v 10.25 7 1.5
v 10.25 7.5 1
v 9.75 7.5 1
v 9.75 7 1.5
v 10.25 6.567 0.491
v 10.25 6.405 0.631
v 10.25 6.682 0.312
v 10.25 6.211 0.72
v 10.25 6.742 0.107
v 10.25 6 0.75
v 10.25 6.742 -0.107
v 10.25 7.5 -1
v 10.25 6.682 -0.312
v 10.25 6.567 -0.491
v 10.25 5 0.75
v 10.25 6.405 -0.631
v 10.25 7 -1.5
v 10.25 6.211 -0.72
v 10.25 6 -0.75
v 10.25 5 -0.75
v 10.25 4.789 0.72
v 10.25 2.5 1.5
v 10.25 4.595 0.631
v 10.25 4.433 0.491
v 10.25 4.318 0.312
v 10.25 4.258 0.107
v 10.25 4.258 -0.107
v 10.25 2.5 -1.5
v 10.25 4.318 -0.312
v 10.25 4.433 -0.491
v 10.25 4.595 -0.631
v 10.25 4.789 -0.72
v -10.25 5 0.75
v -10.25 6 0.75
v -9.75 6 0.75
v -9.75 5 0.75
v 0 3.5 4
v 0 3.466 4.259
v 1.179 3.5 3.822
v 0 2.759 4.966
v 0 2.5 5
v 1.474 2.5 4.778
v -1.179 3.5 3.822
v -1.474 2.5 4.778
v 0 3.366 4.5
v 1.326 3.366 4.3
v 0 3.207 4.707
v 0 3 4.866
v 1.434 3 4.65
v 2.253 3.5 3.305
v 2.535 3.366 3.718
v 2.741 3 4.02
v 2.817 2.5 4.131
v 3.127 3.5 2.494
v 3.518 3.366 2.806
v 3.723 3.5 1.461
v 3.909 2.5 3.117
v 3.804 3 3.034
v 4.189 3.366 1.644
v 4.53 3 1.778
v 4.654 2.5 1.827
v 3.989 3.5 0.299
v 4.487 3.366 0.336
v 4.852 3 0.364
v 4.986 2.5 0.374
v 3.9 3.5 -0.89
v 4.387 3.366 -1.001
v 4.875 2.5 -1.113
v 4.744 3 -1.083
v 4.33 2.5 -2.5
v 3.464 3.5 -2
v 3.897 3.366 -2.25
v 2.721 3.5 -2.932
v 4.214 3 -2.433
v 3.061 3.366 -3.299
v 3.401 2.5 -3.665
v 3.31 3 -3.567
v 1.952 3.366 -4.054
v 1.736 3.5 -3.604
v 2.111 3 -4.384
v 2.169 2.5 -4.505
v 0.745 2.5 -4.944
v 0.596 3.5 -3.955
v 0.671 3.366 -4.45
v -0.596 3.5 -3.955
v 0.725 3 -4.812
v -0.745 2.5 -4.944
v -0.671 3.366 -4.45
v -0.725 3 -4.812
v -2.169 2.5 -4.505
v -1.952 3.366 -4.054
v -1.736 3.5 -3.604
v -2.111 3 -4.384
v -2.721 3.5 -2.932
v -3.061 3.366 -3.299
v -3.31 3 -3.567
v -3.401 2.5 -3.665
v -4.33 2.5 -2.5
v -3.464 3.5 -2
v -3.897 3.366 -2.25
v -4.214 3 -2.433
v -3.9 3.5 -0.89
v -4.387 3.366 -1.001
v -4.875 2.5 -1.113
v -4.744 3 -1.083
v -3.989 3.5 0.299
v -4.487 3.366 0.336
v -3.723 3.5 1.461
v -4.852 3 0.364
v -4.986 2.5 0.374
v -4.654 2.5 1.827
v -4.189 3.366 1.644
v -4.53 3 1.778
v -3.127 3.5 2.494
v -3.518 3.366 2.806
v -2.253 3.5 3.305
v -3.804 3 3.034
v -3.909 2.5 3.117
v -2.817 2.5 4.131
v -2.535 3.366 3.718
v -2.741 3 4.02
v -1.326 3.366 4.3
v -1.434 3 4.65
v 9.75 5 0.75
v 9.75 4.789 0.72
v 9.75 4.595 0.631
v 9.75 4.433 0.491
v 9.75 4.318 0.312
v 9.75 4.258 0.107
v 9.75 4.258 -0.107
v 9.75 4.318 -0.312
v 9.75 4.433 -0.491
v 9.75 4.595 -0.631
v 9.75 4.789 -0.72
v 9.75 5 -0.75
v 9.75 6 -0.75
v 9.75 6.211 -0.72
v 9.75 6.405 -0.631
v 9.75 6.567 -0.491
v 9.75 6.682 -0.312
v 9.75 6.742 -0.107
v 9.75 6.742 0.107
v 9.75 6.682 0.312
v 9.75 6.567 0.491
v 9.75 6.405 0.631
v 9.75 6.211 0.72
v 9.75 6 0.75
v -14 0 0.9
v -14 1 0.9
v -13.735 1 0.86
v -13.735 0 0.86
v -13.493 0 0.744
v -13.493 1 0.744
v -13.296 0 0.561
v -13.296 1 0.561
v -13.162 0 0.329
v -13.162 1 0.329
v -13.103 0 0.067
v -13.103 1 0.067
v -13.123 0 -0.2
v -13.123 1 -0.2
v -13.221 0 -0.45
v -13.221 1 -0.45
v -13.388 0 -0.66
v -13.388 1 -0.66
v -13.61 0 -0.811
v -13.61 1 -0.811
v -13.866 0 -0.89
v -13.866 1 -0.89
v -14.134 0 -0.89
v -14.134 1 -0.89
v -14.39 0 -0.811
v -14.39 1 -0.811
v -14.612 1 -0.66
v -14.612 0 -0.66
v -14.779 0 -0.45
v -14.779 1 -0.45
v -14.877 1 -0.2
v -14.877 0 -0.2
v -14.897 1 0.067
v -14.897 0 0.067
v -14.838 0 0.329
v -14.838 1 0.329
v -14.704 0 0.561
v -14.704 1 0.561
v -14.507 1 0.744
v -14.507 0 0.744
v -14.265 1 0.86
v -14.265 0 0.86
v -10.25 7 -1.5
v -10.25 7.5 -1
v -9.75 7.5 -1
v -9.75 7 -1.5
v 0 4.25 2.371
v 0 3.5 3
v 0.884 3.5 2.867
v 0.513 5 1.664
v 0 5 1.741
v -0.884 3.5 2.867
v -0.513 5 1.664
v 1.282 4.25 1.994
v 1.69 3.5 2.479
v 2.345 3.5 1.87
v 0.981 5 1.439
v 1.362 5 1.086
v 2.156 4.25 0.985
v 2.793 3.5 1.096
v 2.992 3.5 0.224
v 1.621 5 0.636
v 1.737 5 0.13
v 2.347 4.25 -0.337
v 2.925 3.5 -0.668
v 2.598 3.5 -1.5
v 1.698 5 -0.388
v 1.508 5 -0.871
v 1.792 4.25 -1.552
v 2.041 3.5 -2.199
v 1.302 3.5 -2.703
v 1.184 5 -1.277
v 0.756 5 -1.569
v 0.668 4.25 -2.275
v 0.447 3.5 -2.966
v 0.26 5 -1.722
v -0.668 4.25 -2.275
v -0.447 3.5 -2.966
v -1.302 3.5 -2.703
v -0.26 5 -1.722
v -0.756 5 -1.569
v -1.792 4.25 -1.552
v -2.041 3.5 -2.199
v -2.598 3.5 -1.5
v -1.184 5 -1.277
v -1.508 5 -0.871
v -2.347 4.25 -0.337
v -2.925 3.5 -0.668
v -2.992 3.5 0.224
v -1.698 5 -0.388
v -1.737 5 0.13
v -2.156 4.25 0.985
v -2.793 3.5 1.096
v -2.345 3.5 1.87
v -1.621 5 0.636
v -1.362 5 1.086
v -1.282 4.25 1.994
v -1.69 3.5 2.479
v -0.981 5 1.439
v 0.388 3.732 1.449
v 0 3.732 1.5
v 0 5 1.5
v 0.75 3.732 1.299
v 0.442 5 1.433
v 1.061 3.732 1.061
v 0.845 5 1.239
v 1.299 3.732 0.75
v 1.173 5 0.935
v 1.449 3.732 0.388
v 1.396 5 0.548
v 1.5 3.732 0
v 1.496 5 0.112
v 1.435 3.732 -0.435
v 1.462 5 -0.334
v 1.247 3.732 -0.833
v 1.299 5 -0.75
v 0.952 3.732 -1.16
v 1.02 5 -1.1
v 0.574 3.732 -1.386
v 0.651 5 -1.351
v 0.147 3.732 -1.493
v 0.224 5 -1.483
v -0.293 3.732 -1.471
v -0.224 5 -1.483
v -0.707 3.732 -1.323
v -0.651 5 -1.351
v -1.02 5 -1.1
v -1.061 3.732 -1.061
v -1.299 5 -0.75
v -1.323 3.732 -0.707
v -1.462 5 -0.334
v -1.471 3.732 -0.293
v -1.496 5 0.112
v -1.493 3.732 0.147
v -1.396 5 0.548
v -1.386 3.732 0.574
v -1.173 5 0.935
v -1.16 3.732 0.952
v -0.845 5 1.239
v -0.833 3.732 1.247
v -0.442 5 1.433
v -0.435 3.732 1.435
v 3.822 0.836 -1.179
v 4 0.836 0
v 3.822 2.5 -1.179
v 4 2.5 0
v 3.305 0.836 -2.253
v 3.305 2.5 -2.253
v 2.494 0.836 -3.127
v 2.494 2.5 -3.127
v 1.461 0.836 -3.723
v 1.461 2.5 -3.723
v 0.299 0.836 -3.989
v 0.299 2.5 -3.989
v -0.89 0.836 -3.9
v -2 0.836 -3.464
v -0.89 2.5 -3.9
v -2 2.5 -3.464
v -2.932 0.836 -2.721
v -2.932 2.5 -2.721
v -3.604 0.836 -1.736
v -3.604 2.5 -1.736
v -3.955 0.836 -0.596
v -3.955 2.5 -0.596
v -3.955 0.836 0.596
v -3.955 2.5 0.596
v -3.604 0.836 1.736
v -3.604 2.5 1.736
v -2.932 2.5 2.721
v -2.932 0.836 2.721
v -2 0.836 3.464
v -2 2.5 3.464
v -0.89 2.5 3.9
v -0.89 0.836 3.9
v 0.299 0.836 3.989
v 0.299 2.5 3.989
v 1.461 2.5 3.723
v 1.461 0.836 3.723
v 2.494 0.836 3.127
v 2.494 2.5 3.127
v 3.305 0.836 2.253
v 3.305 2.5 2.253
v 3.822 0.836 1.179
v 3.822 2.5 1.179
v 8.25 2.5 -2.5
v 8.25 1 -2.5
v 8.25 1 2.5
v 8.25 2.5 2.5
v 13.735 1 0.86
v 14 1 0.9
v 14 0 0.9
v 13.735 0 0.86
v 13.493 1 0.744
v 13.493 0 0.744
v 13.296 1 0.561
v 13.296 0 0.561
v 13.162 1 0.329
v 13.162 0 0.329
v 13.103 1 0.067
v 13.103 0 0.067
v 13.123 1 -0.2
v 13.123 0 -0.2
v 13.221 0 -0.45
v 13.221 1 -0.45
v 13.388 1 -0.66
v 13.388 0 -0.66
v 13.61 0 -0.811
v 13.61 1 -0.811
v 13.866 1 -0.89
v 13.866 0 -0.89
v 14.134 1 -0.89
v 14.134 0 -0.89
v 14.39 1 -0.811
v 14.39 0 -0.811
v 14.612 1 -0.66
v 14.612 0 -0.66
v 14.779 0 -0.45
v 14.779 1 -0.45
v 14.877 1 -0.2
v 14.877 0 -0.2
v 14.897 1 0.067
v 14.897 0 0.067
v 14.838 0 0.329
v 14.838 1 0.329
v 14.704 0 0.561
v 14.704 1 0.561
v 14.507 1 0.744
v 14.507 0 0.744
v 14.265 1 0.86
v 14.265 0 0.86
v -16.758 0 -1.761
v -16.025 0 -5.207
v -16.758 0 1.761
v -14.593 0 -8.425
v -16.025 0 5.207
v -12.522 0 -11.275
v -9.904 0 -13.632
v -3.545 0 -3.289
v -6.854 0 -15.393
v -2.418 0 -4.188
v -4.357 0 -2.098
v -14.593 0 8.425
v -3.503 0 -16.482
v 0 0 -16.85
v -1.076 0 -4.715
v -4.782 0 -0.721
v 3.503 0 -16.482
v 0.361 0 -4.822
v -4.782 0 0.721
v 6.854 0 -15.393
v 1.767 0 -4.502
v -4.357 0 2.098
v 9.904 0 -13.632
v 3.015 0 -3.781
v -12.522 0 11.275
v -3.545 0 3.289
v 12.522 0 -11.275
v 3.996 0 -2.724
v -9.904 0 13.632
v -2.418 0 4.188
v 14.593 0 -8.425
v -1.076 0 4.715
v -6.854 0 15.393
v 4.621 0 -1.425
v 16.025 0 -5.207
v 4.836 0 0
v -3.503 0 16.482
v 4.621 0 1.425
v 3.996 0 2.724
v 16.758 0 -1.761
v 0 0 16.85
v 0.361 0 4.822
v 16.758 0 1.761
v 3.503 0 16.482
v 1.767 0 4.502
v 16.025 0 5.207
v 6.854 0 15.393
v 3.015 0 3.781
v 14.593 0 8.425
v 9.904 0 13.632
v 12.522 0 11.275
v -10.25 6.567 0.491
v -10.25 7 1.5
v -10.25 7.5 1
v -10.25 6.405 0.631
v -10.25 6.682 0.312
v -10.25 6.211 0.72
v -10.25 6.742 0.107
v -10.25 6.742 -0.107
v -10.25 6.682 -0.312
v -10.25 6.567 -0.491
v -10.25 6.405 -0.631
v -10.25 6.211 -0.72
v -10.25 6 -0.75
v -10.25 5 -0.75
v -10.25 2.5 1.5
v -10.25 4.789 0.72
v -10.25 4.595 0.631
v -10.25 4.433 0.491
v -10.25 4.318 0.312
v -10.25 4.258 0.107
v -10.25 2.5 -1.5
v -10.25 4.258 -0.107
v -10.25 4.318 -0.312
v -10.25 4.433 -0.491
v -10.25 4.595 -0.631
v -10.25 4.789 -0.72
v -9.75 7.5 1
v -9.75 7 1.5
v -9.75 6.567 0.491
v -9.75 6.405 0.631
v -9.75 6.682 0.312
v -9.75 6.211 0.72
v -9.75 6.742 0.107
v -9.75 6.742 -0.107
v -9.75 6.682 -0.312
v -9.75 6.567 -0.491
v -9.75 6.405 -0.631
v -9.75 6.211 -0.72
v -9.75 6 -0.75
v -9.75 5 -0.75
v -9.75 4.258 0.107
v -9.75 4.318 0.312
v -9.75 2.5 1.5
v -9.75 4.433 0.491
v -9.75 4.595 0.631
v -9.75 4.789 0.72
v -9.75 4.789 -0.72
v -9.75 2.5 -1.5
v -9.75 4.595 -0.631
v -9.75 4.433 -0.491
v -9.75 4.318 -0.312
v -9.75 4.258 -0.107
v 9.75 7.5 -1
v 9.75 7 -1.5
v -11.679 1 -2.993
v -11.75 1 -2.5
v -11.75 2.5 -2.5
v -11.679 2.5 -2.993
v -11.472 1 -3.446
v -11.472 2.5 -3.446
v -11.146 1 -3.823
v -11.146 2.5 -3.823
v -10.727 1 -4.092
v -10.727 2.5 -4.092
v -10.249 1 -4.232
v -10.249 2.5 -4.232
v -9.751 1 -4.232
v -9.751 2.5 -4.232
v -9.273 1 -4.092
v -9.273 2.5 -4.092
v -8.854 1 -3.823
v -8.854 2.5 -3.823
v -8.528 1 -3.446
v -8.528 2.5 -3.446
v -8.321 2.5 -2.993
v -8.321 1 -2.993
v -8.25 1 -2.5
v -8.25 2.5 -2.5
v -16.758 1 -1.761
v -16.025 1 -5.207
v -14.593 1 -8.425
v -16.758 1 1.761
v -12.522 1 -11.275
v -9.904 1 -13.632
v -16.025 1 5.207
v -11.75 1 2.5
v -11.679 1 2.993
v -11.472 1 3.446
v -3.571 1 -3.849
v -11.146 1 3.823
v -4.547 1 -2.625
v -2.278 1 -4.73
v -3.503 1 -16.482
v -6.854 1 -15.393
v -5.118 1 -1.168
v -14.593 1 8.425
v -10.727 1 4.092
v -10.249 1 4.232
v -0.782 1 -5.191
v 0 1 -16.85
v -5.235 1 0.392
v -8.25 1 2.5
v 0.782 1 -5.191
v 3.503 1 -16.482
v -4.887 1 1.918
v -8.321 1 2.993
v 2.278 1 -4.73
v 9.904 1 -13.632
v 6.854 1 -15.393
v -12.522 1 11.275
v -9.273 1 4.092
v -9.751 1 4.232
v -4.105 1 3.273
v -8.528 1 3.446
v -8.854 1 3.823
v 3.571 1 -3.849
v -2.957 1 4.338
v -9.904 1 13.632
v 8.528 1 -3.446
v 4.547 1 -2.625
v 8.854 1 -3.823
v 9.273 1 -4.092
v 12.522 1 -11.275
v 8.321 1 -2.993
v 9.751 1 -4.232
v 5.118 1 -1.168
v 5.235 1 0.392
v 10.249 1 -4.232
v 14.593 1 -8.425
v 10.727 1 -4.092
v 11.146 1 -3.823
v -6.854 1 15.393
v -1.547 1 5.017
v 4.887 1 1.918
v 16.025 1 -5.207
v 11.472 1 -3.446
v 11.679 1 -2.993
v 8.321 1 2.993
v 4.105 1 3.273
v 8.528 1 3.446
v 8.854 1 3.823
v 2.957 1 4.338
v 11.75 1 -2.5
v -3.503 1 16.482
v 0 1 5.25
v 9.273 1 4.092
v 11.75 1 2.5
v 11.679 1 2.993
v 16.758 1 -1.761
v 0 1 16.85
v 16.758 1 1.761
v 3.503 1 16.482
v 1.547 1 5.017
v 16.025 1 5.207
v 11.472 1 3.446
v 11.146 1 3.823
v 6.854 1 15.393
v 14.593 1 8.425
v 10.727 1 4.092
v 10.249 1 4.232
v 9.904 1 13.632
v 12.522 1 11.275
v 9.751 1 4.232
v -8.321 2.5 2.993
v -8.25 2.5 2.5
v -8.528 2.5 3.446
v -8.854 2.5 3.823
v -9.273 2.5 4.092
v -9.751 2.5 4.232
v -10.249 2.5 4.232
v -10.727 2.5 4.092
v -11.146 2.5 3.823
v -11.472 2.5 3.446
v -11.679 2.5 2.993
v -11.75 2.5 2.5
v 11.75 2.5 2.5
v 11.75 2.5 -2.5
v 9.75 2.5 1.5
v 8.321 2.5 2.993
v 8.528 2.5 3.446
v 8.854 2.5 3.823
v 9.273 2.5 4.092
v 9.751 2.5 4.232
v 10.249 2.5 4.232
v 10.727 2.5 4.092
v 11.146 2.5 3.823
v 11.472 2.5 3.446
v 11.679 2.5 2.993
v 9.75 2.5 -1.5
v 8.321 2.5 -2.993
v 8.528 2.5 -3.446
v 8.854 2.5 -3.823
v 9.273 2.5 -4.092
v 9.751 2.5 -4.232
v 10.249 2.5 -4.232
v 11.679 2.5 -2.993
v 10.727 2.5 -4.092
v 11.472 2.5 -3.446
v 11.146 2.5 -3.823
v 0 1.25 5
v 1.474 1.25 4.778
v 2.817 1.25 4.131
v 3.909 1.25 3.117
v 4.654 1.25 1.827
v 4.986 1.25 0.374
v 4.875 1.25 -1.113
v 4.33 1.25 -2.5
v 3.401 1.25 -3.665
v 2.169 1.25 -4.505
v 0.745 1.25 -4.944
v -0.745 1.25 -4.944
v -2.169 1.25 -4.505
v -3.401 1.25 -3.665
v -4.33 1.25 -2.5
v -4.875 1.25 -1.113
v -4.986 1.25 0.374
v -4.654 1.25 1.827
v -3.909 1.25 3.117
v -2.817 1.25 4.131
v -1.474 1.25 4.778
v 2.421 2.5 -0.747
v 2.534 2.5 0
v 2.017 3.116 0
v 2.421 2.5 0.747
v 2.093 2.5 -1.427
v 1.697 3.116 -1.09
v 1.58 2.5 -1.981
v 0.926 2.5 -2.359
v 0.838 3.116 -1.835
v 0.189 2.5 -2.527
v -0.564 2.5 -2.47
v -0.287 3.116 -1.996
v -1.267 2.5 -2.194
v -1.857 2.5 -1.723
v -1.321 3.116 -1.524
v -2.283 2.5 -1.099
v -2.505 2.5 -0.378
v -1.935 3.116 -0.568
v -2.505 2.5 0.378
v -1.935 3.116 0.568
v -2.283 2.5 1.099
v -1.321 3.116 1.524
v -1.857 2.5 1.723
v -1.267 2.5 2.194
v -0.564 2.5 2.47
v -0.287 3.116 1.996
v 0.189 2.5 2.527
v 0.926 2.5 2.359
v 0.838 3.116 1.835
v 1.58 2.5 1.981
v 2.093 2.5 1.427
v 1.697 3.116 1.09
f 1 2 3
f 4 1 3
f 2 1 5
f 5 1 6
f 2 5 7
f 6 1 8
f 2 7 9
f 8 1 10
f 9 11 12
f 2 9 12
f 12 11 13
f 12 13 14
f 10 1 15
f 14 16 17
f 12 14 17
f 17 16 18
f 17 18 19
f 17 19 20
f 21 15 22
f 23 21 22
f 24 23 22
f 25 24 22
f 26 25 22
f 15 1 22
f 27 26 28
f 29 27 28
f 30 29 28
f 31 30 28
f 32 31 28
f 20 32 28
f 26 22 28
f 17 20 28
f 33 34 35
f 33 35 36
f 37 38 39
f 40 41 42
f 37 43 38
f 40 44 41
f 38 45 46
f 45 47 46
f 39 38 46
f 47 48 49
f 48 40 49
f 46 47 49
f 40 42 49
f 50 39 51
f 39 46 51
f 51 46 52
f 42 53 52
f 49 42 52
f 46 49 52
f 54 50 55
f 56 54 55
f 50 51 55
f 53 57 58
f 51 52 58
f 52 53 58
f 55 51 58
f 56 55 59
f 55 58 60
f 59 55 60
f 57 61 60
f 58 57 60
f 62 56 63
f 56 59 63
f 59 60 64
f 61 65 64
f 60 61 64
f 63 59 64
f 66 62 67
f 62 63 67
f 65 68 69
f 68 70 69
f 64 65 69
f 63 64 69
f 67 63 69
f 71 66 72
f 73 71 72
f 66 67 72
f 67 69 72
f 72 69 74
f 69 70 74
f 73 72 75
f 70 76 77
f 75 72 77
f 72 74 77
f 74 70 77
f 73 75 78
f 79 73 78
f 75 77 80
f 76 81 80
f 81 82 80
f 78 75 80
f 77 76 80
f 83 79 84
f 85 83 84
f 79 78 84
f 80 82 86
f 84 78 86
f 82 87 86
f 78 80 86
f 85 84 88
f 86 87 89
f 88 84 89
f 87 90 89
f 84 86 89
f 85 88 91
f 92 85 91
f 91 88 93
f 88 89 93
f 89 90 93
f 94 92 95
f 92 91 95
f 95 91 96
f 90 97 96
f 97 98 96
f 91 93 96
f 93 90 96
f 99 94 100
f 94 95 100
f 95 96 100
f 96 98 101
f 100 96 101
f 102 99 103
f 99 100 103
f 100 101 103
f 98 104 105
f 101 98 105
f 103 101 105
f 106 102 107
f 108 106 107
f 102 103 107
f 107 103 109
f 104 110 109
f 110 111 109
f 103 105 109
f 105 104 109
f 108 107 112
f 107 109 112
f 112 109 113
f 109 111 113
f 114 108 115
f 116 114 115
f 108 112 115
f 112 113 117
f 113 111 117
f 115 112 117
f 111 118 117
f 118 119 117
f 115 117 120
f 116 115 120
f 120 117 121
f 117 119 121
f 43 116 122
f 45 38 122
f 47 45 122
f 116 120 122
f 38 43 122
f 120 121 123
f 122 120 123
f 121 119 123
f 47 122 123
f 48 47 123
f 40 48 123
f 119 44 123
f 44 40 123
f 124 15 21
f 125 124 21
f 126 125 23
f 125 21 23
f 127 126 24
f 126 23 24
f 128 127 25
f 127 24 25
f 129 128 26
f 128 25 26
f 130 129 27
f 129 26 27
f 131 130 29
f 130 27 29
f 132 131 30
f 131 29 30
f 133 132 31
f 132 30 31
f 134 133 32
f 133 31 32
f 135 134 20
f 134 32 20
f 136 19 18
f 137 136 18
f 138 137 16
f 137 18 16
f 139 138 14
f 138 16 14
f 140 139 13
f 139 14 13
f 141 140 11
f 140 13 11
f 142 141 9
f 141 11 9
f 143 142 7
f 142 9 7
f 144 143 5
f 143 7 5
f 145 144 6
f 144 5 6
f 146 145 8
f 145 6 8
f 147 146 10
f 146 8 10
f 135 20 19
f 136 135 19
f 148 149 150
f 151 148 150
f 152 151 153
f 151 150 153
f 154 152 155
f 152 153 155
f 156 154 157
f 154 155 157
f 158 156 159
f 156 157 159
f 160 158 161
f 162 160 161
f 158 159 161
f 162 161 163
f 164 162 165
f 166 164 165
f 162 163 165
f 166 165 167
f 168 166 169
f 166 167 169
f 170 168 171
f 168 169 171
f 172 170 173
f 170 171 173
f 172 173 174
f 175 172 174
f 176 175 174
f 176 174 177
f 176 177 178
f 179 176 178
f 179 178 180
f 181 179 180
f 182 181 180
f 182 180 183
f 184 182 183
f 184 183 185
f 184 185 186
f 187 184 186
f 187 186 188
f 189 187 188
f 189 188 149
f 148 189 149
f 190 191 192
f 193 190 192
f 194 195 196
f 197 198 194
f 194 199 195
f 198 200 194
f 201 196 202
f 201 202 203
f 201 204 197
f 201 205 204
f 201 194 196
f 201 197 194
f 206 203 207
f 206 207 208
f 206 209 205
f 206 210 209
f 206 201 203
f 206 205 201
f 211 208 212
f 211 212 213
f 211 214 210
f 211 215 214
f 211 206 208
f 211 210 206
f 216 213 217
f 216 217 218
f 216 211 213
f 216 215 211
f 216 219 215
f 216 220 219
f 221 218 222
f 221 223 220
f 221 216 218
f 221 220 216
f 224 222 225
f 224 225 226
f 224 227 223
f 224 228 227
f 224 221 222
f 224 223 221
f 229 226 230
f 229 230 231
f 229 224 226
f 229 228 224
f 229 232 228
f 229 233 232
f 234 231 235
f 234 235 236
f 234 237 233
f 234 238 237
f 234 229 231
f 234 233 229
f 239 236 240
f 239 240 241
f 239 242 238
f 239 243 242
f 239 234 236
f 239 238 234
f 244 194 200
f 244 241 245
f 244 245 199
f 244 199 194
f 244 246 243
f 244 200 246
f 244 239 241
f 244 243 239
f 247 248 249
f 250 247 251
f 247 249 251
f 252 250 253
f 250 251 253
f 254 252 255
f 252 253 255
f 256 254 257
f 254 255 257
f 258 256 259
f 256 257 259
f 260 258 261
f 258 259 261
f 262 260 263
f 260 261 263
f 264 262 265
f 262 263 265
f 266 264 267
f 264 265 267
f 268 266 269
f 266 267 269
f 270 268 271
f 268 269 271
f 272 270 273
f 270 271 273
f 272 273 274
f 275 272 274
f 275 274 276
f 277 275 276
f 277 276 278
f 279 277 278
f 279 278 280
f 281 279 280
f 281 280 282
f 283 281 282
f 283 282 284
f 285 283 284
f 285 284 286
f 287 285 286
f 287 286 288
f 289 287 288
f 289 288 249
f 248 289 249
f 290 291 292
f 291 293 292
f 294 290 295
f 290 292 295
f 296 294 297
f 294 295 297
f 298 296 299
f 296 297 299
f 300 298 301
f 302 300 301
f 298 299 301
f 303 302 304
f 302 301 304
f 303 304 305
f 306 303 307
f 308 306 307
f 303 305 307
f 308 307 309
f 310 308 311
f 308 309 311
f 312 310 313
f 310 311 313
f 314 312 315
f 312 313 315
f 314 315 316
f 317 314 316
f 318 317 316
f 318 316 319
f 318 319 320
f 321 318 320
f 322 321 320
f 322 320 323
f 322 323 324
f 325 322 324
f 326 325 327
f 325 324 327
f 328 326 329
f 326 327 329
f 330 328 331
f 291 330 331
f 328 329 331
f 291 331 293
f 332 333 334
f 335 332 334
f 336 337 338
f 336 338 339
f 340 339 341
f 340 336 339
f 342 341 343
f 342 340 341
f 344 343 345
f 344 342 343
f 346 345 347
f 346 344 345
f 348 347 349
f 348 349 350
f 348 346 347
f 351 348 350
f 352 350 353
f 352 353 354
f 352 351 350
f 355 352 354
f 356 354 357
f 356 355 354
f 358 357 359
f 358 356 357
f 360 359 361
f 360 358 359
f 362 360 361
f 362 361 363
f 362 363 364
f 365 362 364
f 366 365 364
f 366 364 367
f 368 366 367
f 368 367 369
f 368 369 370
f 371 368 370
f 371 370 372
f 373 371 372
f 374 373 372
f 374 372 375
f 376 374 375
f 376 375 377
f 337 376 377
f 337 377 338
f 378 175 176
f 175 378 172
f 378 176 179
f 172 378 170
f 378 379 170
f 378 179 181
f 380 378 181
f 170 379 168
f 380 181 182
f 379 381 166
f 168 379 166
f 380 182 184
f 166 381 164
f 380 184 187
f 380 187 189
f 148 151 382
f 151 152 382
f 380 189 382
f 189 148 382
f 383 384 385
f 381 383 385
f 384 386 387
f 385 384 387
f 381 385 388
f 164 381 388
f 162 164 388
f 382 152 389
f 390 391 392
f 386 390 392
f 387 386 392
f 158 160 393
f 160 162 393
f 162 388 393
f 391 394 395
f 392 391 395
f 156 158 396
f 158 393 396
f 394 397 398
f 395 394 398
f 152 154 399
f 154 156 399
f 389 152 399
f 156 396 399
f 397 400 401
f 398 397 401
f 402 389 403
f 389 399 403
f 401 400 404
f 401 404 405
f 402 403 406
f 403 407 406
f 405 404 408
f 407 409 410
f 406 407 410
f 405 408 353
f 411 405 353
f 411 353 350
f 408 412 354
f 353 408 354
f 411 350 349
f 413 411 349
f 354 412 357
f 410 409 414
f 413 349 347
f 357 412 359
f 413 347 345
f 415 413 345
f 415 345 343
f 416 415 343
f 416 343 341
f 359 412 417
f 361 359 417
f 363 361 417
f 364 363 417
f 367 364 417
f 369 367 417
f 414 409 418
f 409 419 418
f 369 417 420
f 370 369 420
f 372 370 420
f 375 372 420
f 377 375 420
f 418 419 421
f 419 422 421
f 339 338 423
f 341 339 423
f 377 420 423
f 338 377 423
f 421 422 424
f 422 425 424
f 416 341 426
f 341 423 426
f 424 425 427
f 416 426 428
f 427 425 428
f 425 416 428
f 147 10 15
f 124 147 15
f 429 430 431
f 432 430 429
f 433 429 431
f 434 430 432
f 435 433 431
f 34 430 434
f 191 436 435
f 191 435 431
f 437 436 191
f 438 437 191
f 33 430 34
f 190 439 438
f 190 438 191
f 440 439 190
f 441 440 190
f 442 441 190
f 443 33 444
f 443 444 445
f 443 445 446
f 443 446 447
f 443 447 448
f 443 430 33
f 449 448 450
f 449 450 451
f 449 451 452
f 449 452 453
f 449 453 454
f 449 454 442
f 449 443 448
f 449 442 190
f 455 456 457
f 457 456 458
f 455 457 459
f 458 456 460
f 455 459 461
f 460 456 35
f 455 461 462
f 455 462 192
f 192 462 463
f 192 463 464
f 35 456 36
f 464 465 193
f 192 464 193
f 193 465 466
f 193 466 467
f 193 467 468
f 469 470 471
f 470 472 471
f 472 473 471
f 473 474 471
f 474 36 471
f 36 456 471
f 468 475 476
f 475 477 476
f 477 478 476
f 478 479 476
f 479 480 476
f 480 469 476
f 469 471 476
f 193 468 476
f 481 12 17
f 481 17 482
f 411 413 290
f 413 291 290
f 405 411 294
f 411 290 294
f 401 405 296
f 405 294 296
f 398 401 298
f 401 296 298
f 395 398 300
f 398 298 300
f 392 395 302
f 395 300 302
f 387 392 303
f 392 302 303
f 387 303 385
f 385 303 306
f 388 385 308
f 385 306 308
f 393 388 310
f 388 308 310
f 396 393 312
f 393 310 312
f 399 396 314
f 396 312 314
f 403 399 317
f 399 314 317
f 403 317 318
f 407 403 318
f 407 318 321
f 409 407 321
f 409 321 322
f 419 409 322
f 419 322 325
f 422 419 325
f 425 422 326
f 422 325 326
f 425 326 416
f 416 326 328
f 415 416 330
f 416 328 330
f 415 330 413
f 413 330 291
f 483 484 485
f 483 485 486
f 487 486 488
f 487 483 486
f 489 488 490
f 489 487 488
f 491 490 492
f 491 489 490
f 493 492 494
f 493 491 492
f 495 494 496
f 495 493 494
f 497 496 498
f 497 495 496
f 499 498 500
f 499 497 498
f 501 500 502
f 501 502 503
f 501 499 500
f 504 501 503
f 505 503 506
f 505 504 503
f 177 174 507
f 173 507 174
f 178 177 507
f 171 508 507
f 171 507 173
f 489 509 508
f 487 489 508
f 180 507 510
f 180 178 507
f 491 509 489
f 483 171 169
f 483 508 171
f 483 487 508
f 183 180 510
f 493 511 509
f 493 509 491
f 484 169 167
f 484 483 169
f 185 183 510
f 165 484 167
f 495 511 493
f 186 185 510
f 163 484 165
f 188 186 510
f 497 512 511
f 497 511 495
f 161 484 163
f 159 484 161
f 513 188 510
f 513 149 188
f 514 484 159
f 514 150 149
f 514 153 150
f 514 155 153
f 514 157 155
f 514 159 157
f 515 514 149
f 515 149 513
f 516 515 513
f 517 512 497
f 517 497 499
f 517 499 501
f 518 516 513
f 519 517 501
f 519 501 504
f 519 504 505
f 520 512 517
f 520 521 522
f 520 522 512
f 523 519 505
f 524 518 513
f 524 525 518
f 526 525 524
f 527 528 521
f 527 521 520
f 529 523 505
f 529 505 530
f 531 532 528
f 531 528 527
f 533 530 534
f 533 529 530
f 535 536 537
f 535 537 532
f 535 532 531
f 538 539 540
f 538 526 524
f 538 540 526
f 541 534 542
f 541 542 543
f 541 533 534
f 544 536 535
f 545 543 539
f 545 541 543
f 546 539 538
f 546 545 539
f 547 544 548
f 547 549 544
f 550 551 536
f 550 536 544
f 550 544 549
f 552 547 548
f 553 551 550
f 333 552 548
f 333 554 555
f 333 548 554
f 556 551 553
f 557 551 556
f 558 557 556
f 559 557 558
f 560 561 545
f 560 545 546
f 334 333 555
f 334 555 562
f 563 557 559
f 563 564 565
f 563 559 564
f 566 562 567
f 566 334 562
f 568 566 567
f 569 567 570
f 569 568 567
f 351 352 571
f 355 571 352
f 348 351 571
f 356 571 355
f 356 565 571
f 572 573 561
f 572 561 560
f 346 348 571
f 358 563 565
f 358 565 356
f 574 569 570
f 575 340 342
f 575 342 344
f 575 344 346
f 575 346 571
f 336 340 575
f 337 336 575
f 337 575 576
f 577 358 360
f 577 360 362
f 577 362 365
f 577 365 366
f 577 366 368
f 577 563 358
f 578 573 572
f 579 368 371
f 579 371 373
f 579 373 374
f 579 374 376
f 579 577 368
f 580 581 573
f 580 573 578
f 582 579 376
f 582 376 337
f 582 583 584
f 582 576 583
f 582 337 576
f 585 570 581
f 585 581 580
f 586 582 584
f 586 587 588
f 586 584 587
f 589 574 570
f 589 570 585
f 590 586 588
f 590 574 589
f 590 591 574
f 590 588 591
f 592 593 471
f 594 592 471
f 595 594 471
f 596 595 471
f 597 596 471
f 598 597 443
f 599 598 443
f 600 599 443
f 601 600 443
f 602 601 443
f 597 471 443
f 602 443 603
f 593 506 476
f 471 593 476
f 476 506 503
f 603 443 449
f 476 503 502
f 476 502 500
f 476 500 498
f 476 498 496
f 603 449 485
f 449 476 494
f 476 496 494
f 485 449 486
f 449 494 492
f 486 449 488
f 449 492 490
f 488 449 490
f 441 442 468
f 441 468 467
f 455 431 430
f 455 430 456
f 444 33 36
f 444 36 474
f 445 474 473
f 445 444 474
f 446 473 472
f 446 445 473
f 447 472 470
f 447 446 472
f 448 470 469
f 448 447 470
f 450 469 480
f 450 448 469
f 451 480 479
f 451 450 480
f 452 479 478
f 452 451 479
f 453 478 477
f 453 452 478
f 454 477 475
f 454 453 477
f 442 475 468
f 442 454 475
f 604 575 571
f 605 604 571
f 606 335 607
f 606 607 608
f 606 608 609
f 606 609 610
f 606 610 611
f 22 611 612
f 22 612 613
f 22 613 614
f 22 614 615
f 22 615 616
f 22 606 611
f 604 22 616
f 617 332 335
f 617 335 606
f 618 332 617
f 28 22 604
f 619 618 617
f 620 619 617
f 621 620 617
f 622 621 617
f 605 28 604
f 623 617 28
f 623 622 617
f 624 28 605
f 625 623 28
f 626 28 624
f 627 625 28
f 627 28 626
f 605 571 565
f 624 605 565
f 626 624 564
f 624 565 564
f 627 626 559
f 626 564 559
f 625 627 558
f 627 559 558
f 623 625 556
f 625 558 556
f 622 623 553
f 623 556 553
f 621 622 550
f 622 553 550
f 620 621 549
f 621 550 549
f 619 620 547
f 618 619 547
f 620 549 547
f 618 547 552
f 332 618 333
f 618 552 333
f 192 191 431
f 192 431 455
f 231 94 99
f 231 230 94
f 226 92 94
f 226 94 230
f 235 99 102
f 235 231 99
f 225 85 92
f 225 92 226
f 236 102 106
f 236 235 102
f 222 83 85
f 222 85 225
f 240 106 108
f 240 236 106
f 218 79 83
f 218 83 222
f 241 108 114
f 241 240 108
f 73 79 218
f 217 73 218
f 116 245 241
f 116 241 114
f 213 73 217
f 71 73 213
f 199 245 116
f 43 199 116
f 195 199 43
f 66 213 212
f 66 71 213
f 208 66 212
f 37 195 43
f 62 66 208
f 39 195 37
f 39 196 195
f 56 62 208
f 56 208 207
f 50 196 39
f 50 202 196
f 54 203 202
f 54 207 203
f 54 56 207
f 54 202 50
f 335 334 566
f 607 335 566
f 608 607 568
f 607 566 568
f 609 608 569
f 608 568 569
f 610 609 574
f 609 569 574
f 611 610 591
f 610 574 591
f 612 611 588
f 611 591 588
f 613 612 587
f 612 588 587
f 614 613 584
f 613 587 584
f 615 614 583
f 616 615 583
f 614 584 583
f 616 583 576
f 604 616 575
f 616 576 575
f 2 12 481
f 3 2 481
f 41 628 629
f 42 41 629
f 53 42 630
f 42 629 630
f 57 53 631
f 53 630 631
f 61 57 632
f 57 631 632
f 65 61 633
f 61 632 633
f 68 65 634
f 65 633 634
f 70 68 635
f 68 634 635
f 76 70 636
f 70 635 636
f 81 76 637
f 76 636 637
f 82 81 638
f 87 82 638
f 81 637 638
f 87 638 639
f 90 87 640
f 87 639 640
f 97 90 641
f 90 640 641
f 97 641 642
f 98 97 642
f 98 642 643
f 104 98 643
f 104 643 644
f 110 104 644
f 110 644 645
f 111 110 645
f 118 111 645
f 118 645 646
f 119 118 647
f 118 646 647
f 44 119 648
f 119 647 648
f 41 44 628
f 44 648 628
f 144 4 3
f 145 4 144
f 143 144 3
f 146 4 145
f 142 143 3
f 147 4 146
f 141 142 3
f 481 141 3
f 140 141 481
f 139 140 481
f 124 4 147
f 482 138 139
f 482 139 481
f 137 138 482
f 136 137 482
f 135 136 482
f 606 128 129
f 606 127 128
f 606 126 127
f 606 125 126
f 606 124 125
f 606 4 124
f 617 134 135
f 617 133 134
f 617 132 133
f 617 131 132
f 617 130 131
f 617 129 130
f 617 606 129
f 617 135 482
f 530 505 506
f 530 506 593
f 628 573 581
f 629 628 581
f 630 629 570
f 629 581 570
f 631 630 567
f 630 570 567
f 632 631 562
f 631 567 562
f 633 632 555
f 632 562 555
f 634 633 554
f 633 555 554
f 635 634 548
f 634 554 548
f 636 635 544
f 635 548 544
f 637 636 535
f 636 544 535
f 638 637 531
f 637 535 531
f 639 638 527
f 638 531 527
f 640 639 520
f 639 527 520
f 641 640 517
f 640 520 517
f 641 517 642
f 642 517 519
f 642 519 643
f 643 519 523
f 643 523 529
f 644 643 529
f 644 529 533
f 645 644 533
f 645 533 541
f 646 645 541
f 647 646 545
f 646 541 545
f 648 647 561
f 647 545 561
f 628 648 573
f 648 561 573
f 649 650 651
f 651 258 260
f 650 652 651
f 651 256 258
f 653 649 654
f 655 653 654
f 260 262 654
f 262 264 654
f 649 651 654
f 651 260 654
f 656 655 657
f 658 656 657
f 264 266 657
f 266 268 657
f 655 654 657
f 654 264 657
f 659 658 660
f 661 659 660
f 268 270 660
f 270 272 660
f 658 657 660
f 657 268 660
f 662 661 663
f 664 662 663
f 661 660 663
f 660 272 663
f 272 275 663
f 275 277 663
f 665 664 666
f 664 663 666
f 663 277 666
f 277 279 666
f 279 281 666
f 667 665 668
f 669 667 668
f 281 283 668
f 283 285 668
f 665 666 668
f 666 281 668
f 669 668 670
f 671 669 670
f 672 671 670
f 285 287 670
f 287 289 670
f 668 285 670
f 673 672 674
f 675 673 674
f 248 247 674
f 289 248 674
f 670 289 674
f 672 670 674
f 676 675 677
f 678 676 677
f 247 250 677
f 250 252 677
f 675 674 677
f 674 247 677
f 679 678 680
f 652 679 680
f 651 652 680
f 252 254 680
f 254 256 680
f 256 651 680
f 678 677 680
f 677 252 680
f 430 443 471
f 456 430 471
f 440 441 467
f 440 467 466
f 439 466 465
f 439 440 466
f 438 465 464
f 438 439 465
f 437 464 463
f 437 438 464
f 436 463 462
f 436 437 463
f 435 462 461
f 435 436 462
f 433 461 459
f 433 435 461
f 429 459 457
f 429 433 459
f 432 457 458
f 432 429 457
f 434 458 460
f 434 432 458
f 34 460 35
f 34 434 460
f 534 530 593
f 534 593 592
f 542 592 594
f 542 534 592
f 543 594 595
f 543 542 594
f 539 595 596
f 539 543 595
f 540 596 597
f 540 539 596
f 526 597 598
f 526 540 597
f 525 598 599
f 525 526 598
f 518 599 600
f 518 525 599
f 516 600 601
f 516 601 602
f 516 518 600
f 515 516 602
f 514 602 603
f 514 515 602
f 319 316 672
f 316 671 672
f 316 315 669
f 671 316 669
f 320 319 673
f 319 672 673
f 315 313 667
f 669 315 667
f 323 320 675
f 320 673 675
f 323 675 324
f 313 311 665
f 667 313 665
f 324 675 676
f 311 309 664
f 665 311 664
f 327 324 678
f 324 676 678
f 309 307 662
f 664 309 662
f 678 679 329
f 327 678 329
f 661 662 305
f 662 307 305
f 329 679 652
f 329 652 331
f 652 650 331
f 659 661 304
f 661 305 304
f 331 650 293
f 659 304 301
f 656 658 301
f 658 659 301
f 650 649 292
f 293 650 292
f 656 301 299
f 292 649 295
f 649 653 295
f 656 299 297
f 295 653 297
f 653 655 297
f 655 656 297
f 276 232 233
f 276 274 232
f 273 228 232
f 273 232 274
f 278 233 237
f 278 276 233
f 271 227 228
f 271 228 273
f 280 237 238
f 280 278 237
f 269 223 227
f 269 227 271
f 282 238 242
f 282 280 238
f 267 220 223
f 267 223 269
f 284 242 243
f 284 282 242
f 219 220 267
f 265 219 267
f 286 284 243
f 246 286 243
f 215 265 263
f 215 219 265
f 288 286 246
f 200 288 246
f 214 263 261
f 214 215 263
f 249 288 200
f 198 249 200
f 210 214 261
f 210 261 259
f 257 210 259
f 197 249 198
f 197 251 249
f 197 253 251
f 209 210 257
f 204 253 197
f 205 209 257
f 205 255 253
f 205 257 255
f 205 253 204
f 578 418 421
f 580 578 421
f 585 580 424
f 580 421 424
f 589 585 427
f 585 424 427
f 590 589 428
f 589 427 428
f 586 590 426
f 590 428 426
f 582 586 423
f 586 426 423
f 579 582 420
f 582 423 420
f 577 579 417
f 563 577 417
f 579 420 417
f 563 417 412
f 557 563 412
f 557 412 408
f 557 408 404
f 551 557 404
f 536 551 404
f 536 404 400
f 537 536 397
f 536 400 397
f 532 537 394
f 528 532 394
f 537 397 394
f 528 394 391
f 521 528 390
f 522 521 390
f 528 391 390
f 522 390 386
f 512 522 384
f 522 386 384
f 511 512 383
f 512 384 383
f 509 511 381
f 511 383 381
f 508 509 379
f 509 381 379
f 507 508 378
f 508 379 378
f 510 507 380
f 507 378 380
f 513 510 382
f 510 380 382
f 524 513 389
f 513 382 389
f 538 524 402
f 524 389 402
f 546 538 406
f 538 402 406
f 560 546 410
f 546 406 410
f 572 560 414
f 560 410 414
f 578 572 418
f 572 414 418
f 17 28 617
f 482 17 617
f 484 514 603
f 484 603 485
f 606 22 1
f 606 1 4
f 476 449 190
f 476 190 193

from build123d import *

# Parameters (mm, degrees)
SKETCH1_R                = 16.85
BOSS_EXTRUDE1_DEPTH      = 1
SKETCH2_R                = 5
BOSS_EXTRUDE2_DEPTH      = 2.5
SKETCH3_R                = 3
BOSS_EXTRUDE3_DEPTH      = 1.5
CHAMFER1_SIZE2           = 1.258649447
CHAMFER1_SIZE            = 1.5
FILLET1_R                = 1
CHAMFER3_SIZE            = 0.25
CUT_EXTRUDE2_REACH       = 26.163
SKETCH5_R                = 0.9
CUT_EXTRUDE1_REACH       = 26.348
SKETCH4_R                = 1.5
BOSS_EXTRUDE4_DEPTH      = 1.5
SKETCH7_W                = 0.5
SKETCH7_H                = 3
BOSS_EXTRUDE5_DEPTH      = 5
CHAMFER4_SIZE            = 0.5
CUT_EXTRUDE3_REACH       = 34.781
CHAMFER4_OF_MIRROR1_SIZE = 0.5


# Read off the part's stored shape, not the designer's step: Shell2
with BuildPart() as part:
    # Sketch1 → Boss-Extrude1 (new body)
    with BuildSketch(Plane(origin=(0, 0, 0), x_dir=(1, 0, 0), z_dir=(0, 1, 0))):
        with Locations(Location((0, 0, 0), (0, 0, 270))):
            Circle(SKETCH1_R)
    extrude(amount=BOSS_EXTRUDE1_DEPTH)

    # Sketch2 → Boss-Extrude2 (add)
    with BuildSketch(Plane(origin=(0, 1, 0), x_dir=(1, 0, 0), z_dir=(0, 1, 0))):
        with Locations(Location((0, 0, 0), (0, 0, 270))):
            Circle(SKETCH2_R)
    extrude(amount=BOSS_EXTRUDE2_DEPTH)

    # Sketch3 → Boss-Extrude3 (add)
    with BuildSketch(Plane(origin=(0, 3.5, 0), x_dir=(1, 0, 0), z_dir=(0, 1, 0))):
        with Locations(Location((0, 0, 0), (0, 0, 270))):
            Circle(SKETCH3_R)
    extrude(amount=BOSS_EXTRUDE3_DEPTH)

    # Chamfer1
    chamfer1_edges = [part.edges().sort_by_distance(p)[0] for p in [
        (0, 5, -3),
    ]]
    chamfer1_side = [part.faces().sort_by_distance(p)[0] for p in [
        (0, 4.974827011, -3),
    ]]
    chamfer(chamfer1_edges, length=CHAMFER1_SIZE - 0.0001, length2=CHAMFER1_SIZE2 - 0.0001, reference=chamfer1_side[0])  # a hair under: the kernel refuses the full size

    # Fillet1
    fillet1_edges = [part.edges().sort_by_distance(p)[0] for p in [
        (0, 3.5, -5),
    ]]
    fillet(fillet1_edges, radius=FILLET1_R)

    # Chamfer3
    chamfer3_edges = [part.edges().sort_by_distance(p)[0] for p in [
        (0, 1, -5),
    ]]
    chamfer(chamfer3_edges, length=CHAMFER3_SIZE)

    # Shell2 outline → Shell2 (revolve, cut)
    with BuildSketch(Plane.XY):
        Polygon((4, 0.835786438), (4, 2.5), (2.533692342, 2.5), (1.275042895, 4), (0, 4), (0, 0), (4.835786438, 0), align=None)
    revolve(axis=Axis((0, 0, 0), (0, 1, 0)), mode=Mode.SUBTRACT)

    # Sketch5 → Cut-Extrude2 (cut, up to next)
    with BuildSketch(Plane(origin=(0, 1, 0), x_dir=(1, 0, 0), z_dir=(0, 1, 0)), mode=Mode.PRIVATE) as cut_extrude2_sk1:
        with Locations(Location((-14, 0, 0), (0, 0, 270))):
            Circle(SKETCH5_R)
    cut_extrude2_tool1 = extrude(cut_extrude2_sk1.sketch, amount=-CUT_EXTRUDE2_REACH, mode=Mode.PRIVATE) & part.part
    cut_extrude2 = cut_extrude2_tool1.solids().sort_by_distance((-14, 1, 0))[0]
    add(cut_extrude2, mode=Mode.SUBTRACT)

    # Sketch4 → Cut-Extrude1 (cut, up to next)
    with BuildSketch(Plane(origin=(0, 5, 0), x_dir=(1, 0, 0), z_dir=(0, 1, 0)), mode=Mode.PRIVATE) as cut_extrude1_sk1:
        with Locations(Location((0, 0, 0), (0, 0, 270))):
            Circle(SKETCH4_R)
    cut_extrude1_tool1 = extrude(cut_extrude1_sk1.sketch, amount=-CUT_EXTRUDE1_REACH, mode=Mode.PRIVATE) & part.part
    add(cut_extrude1_tool1.solids().sort_by_distance((0, 5, 0))[0], mode=Mode.SUBTRACT)

    # Sketch6 → Boss-Extrude4 (add)
    with BuildSketch(Plane(origin=(0, 1, 0), x_dir=(1, 0, 0), z_dir=(0, 1, 0))):
        with BuildLine():
            Line((-11.75, -2.5), (-11.75, 2.5))
            ThreePointArc((-11.75, 2.5), (-10, 4.25), (-8.25, 2.5))
            Line((-8.25, 2.5), (-8.25, -2.5))
            ThreePointArc((-8.25, -2.5), (-10, -4.25), (-11.75, -2.5))
        make_face()
    boss_extrude4 = extrude(amount=BOSS_EXTRUDE4_DEPTH)

    # Sketch7 → Boss-Extrude5 (add)
    with BuildSketch(Plane(origin=(0, 2.5, 0), x_dir=(1, 0, 0), z_dir=(0, 1, 0))):
        with Locations((-10, 0)):
            Rectangle(SKETCH7_W, SKETCH7_H)
    boss_extrude5 = extrude(amount=BOSS_EXTRUDE5_DEPTH)

    # Chamfer4
    chamfer4_edges = [part.edges().sort_by_distance(p)[0] for p in [
        (-10, 7.5, -1.5),
        (-10, 7.5, 1.5),
    ]]
    chamfer(chamfer4_edges, length=CHAMFER4_SIZE)

    # Sketch8 → Cut-Extrude3 (cut, up to next)
    with BuildSketch(Plane.ZY.offset(10.25), mode=Mode.PRIVATE) as cut_extrude3_sk1:
        with BuildLine():
            Line((-0.75, 5), (-0.75, 6))
            ThreePointArc((-0.75, 6), (0, 6.75), (0.75, 6))
            Line((0.75, 6), (0.75, 5))
            ThreePointArc((0.75, 5), (0, 4.25), (-0.75, 5))
        make_face()
    cut_extrude3_tool1 = extrude(cut_extrude3_sk1.sketch, amount=-CUT_EXTRUDE3_REACH, mode=Mode.PRIVATE) & part.part
    cut_extrude3 = cut_extrude3_tool1.solids().sort_by_distance((-10.25, 5.5, 0))[0]
    add(cut_extrude3, mode=Mode.SUBTRACT)

    # Mirror1: Cut-Extrude2, Boss-Extrude4, Boss-Extrude5, Cut-Extrude3 across plane
    add(cut_extrude2.mirror(Plane(origin=(0, 0, 0), x_dir=(0, 0, 1), z_dir=(1, 0, 0))), mode=Mode.SUBTRACT)
    add(boss_extrude4.mirror(Plane(origin=(0, 0, 0), x_dir=(0, 0, 1), z_dir=(1, 0, 0))))
    add(boss_extrude5.mirror(Plane(origin=(0, 0, 0), x_dir=(0, 0, 1), z_dir=(1, 0, 0))))
    add(cut_extrude3.mirror(Plane(origin=(0, 0, 0), x_dir=(0, 0, 1), z_dir=(1, 0, 0))), mode=Mode.SUBTRACT)

    # Chamfer4 of Mirror1
    chamfer4_of_mirror1_edges = [part.edges().sort_by_distance(p)[0] for p in [
        (10, 7.5, -1.5),
        (10, 7.5, 1.5),
    ]]
    chamfer(chamfer4_of_mirror1_edges, length=CHAMFER4_OF_MIRROR1_SIZE)


solid = part.part
